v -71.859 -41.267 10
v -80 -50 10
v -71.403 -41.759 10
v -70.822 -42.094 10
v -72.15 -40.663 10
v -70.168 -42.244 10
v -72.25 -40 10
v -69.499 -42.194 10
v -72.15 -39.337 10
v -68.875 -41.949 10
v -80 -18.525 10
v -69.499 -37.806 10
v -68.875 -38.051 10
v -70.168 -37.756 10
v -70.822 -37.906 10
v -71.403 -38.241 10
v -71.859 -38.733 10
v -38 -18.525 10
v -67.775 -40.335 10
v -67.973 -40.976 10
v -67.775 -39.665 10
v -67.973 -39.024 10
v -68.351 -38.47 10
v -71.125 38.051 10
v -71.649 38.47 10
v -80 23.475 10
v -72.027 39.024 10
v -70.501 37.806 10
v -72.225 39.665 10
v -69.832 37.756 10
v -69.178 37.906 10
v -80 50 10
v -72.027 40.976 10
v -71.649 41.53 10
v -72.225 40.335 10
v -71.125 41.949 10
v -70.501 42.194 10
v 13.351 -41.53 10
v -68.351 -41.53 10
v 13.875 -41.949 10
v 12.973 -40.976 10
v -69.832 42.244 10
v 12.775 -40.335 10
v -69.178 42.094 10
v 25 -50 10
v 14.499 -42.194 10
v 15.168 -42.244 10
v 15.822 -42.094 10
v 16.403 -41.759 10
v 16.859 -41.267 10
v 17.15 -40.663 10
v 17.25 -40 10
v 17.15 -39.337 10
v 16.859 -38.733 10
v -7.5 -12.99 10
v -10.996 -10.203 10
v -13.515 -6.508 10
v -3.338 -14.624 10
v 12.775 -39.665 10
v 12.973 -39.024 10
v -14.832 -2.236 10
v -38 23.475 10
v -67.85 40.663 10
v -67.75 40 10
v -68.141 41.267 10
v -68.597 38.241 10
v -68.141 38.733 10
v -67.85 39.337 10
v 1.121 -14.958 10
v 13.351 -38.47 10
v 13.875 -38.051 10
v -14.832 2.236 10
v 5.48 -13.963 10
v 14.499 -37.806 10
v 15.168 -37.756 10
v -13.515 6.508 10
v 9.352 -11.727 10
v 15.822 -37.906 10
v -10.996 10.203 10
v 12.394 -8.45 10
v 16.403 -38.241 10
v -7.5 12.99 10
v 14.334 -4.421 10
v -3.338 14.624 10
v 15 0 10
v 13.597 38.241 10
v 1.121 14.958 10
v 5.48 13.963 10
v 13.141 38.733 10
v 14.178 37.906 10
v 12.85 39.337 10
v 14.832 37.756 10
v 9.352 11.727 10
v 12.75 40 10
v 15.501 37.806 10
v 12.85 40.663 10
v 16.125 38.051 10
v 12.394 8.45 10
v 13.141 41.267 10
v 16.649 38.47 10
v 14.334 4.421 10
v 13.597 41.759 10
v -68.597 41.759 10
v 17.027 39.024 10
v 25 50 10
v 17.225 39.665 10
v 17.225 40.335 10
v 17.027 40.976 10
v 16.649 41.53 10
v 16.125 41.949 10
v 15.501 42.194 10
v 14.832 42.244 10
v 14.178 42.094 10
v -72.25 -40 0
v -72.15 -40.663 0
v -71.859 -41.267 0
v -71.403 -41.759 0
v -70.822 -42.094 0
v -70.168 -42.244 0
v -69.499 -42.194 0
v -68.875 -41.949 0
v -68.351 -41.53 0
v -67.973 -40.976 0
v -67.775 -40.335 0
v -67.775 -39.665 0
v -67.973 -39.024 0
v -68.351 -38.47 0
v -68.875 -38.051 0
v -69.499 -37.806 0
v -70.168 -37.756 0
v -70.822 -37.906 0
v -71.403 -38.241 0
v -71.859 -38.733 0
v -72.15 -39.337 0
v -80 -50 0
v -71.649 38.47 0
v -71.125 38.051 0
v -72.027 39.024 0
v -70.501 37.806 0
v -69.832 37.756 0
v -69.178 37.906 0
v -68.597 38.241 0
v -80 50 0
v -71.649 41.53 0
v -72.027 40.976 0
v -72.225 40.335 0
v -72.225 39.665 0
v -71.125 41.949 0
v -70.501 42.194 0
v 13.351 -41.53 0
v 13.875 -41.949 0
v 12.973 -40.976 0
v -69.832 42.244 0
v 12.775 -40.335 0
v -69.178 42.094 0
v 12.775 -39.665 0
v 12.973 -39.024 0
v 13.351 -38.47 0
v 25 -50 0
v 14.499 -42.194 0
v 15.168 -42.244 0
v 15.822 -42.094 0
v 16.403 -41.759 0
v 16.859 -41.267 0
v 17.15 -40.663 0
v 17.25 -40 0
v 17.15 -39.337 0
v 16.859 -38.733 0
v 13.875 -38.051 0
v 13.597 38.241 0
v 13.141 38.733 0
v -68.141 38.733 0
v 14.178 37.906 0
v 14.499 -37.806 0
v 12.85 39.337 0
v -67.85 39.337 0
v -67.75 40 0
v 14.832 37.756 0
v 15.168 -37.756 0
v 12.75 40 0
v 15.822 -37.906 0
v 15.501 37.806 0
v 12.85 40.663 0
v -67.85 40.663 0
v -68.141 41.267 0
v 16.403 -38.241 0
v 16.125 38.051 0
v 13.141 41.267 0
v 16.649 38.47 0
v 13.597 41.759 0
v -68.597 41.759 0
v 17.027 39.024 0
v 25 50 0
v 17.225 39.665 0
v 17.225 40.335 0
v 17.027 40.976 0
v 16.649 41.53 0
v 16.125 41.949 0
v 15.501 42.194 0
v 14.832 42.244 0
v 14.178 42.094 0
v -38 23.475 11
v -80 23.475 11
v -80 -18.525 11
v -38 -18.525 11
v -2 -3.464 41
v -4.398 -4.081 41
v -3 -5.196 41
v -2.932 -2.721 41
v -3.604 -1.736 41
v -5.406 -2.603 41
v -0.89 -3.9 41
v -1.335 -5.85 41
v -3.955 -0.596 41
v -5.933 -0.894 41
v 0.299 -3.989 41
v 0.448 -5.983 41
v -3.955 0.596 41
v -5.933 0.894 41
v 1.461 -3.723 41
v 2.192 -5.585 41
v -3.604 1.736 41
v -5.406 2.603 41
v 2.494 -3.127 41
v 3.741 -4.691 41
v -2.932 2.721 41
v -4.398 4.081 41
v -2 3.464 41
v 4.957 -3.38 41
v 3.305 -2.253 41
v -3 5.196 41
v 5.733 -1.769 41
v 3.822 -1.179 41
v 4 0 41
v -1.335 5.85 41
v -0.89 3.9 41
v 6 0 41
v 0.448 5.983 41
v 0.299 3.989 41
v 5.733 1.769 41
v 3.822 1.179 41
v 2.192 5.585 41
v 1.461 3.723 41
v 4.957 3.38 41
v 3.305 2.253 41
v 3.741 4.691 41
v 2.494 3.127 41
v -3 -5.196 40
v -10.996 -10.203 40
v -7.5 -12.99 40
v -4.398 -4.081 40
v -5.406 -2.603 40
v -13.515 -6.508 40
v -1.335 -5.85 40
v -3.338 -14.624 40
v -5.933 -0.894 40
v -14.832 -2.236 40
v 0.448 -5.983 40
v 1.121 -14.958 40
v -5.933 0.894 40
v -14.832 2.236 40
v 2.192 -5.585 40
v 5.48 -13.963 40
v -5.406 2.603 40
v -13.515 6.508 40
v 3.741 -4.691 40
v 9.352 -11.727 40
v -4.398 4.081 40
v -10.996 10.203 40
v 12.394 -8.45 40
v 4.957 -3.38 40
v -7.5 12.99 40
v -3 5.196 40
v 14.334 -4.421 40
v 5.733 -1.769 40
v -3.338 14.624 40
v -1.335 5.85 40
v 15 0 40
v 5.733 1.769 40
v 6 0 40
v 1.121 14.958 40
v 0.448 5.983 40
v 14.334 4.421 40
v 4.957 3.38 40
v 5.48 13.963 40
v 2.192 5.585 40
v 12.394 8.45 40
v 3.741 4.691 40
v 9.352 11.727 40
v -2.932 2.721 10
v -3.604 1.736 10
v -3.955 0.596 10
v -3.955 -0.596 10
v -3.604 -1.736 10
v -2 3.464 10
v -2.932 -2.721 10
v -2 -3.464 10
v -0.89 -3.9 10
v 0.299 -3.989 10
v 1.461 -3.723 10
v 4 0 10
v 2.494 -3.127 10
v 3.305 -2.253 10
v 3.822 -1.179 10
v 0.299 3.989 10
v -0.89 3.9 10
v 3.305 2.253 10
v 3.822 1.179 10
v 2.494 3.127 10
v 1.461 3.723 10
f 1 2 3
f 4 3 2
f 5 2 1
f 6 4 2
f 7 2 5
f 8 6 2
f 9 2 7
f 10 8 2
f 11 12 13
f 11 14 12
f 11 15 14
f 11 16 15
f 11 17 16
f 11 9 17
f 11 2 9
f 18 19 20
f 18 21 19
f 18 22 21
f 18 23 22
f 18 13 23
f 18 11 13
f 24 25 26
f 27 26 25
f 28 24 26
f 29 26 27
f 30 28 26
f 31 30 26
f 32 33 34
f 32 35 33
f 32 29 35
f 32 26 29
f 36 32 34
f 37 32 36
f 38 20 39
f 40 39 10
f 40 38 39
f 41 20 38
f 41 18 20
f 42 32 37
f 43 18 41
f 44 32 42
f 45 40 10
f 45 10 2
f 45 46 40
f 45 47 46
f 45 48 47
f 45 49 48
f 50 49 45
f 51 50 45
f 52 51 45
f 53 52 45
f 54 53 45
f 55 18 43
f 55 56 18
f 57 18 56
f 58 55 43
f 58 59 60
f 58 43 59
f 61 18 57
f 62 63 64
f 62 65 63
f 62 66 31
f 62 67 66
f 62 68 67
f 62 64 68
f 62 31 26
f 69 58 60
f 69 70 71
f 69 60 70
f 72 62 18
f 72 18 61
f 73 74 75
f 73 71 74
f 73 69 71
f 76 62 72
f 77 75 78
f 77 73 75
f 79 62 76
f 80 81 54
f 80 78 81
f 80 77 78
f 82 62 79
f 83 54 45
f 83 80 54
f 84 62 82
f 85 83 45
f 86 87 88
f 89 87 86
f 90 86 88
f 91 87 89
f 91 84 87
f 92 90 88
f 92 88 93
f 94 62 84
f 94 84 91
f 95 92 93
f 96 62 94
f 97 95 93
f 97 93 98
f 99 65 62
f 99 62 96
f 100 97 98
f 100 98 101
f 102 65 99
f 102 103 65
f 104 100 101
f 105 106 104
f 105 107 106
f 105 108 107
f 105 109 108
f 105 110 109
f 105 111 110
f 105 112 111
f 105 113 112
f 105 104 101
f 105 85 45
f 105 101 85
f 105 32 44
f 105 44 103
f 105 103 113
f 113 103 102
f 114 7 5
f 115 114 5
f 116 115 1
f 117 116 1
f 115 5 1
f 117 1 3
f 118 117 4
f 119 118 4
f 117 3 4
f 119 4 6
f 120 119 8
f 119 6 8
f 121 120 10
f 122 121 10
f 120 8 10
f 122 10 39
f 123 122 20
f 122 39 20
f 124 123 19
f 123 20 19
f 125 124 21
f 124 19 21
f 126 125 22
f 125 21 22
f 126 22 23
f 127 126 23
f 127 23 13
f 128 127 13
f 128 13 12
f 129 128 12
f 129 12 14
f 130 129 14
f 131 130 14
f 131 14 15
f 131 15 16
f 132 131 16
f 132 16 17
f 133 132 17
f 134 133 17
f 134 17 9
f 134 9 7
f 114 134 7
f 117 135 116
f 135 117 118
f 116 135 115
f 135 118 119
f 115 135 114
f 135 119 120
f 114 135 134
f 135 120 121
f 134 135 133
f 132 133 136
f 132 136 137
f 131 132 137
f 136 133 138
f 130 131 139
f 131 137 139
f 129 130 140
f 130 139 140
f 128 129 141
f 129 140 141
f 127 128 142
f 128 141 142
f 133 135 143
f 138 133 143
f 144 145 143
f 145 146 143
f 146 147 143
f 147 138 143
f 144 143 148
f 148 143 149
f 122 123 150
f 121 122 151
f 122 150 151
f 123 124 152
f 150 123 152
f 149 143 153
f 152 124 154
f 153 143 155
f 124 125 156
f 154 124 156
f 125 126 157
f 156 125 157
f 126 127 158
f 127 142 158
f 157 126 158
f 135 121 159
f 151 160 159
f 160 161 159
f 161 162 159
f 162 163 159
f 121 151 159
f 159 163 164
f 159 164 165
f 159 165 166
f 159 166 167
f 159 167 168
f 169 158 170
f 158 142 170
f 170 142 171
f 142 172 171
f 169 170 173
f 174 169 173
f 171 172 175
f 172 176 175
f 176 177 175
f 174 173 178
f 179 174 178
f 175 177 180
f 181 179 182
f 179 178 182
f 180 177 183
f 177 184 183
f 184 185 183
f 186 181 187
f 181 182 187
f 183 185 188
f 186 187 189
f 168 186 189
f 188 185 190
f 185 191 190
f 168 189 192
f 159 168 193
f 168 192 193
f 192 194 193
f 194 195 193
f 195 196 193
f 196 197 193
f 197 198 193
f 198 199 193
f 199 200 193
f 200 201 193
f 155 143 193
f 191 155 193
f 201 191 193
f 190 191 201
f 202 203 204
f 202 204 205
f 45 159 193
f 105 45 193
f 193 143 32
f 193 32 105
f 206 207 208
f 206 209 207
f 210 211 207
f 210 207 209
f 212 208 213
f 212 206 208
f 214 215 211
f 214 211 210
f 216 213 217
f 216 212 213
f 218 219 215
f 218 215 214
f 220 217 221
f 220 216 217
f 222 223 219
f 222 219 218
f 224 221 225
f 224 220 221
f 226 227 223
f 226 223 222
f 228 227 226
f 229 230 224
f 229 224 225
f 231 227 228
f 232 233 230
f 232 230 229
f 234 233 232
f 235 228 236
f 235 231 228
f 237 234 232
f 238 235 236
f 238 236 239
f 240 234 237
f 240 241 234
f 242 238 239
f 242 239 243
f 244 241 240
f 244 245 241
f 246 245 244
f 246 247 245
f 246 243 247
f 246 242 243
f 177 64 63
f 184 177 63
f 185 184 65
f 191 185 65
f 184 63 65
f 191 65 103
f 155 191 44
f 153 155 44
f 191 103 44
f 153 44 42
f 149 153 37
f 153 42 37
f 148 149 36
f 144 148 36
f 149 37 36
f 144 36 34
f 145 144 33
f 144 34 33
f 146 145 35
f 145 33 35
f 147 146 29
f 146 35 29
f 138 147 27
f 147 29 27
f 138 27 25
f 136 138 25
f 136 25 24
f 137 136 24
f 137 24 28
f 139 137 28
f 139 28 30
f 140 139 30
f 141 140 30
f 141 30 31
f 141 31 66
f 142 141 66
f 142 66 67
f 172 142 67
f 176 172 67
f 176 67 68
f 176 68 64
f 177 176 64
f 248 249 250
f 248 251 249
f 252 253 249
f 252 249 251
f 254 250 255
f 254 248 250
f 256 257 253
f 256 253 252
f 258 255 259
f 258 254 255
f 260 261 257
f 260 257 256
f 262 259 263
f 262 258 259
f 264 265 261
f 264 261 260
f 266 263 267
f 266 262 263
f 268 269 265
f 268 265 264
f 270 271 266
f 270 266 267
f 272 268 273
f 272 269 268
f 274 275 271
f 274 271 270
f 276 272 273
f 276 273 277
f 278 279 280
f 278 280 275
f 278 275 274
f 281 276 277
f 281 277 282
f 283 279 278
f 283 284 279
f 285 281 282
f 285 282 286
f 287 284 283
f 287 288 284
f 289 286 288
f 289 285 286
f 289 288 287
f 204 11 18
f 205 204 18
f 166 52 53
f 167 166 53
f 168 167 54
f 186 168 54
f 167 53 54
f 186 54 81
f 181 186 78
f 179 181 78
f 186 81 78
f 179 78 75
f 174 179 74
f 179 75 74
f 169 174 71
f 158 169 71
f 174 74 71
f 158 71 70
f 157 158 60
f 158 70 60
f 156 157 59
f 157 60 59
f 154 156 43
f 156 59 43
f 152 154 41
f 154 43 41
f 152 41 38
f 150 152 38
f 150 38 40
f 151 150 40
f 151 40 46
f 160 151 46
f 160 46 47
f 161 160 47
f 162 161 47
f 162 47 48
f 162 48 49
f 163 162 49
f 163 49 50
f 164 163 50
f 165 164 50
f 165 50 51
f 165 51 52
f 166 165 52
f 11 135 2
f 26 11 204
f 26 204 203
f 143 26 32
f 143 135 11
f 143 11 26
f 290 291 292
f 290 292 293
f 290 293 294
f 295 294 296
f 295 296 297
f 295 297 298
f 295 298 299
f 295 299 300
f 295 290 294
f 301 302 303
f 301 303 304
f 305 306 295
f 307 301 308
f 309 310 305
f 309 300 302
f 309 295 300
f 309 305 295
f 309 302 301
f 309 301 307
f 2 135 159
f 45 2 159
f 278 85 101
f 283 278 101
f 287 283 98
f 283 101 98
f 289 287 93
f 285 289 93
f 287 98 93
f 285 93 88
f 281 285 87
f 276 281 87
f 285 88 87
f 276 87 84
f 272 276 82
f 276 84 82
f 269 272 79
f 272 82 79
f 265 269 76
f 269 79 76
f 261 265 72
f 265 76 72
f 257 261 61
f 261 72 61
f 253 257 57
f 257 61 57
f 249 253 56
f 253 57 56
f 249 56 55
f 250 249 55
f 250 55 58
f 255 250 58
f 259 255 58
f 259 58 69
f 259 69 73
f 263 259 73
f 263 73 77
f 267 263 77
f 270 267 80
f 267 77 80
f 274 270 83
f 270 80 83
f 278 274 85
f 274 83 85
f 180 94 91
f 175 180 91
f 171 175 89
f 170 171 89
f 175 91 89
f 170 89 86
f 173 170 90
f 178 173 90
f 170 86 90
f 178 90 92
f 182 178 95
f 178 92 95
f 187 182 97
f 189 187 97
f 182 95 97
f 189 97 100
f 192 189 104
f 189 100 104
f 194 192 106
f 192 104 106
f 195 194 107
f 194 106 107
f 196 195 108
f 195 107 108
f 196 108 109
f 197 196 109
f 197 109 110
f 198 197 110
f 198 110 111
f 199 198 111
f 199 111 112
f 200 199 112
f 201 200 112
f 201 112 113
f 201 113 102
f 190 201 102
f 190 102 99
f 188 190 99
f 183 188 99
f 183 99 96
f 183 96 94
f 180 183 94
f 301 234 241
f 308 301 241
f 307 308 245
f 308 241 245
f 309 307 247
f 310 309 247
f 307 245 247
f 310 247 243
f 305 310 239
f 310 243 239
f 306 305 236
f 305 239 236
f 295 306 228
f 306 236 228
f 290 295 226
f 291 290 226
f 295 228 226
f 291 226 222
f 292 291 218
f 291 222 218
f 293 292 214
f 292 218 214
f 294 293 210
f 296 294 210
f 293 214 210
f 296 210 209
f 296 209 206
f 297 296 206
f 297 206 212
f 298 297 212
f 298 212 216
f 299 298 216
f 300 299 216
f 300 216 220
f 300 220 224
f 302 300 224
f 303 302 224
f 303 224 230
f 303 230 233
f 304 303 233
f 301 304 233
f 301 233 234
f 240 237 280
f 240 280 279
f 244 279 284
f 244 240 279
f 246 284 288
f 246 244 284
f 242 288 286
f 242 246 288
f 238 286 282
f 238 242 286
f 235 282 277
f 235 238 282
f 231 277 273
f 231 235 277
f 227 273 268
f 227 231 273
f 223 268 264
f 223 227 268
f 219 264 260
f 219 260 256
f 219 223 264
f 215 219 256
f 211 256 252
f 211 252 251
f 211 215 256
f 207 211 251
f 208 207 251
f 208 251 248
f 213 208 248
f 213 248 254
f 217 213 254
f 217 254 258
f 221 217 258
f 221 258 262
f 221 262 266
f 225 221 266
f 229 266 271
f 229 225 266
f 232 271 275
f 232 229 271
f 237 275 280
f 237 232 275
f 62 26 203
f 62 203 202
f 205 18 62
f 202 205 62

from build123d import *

# Parameters (mm, degrees)
SKETCH1_W           = 105
SKETCH1_H           = 100
BOSS_EXTRUDE1_DEPTH = 10
SKETCH4_R           = 15
BOSS_EXTRUDE2_DEPTH = 30
SKETCH5_R           = 4
CUT_EXTRUDE3_DEPTH  = 30
SKETCH6_W           = 42
SKETCH6_H           = 42
BOSS_EXTRUDE3_DEPTH = 1
SKETCH2_R           = 2.25
CUT_EXTRUDE4_DEPTH  = 99.994949366
BOSS_EXTRUDE4_START = 1
LOCAL_FILES1_R      = 6
LOCAL_FILES1_R_2    = 4
BOSS_EXTRUDE4_DEPTH = 1


with BuildPart() as part:
    # Sketch1 → Boss-Extrude1 (new body)
    with BuildSketch(Plane.XY):
        with Locations((-27.5, 0)):
            Rectangle(SKETCH1_W, SKETCH1_H)
    extrude(amount=BOSS_EXTRUDE1_DEPTH)

    # Sketch4 → Boss-Extrude2 (add)
    with BuildSketch(Plane.XY.offset(10)):
        Circle(SKETCH4_R)
    extrude(amount=BOSS_EXTRUDE2_DEPTH)

    # Sketch5 → Cut-Extrude3 (cut)
    with BuildSketch(Plane.XY.offset(40)):
        Circle(SKETCH5_R)
    extrude(amount=-CUT_EXTRUDE3_DEPTH, mode=Mode.SUBTRACT)

    # Sketch6 → Boss-Extrude3 (add)
    with BuildSketch(Plane.XY.offset(10)):
        with Locations((-59, 2.474517647)):
            Rectangle(SKETCH6_W, SKETCH6_H)
    extrude(amount=BOSS_EXTRUDE3_DEPTH)

    # Sketch2 → Cut-Extrude4 (cut, through all)
    with BuildSketch(Plane.XY.offset(10)):
        with Locations((-70, 40)):
            Circle(SKETCH2_R)
        with Locations((15, -40)):
            Circle(SKETCH2_R)
        with Locations(Location((-70, -40, 0), (0, 0, 180))):
            Circle(SKETCH2_R)
        with Locations(Location((15, 40, 0), (0, 0, 180))):
            Circle(SKETCH2_R)
    extrude(amount=-CUT_EXTRUDE4_DEPTH, mode=Mode.SUBTRACT)

    # Local Files1 → Boss-Extrude4 (add)
    with BuildSketch(Plane.XY.offset(40).offset(BOSS_EXTRUDE4_START)):
        Circle(LOCAL_FILES1_R)
        Circle(LOCAL_FILES1_R_2, mode=Mode.SUBTRACT)
    extrude(amount=-BOSS_EXTRUDE4_DEPTH)


solid = part.part
